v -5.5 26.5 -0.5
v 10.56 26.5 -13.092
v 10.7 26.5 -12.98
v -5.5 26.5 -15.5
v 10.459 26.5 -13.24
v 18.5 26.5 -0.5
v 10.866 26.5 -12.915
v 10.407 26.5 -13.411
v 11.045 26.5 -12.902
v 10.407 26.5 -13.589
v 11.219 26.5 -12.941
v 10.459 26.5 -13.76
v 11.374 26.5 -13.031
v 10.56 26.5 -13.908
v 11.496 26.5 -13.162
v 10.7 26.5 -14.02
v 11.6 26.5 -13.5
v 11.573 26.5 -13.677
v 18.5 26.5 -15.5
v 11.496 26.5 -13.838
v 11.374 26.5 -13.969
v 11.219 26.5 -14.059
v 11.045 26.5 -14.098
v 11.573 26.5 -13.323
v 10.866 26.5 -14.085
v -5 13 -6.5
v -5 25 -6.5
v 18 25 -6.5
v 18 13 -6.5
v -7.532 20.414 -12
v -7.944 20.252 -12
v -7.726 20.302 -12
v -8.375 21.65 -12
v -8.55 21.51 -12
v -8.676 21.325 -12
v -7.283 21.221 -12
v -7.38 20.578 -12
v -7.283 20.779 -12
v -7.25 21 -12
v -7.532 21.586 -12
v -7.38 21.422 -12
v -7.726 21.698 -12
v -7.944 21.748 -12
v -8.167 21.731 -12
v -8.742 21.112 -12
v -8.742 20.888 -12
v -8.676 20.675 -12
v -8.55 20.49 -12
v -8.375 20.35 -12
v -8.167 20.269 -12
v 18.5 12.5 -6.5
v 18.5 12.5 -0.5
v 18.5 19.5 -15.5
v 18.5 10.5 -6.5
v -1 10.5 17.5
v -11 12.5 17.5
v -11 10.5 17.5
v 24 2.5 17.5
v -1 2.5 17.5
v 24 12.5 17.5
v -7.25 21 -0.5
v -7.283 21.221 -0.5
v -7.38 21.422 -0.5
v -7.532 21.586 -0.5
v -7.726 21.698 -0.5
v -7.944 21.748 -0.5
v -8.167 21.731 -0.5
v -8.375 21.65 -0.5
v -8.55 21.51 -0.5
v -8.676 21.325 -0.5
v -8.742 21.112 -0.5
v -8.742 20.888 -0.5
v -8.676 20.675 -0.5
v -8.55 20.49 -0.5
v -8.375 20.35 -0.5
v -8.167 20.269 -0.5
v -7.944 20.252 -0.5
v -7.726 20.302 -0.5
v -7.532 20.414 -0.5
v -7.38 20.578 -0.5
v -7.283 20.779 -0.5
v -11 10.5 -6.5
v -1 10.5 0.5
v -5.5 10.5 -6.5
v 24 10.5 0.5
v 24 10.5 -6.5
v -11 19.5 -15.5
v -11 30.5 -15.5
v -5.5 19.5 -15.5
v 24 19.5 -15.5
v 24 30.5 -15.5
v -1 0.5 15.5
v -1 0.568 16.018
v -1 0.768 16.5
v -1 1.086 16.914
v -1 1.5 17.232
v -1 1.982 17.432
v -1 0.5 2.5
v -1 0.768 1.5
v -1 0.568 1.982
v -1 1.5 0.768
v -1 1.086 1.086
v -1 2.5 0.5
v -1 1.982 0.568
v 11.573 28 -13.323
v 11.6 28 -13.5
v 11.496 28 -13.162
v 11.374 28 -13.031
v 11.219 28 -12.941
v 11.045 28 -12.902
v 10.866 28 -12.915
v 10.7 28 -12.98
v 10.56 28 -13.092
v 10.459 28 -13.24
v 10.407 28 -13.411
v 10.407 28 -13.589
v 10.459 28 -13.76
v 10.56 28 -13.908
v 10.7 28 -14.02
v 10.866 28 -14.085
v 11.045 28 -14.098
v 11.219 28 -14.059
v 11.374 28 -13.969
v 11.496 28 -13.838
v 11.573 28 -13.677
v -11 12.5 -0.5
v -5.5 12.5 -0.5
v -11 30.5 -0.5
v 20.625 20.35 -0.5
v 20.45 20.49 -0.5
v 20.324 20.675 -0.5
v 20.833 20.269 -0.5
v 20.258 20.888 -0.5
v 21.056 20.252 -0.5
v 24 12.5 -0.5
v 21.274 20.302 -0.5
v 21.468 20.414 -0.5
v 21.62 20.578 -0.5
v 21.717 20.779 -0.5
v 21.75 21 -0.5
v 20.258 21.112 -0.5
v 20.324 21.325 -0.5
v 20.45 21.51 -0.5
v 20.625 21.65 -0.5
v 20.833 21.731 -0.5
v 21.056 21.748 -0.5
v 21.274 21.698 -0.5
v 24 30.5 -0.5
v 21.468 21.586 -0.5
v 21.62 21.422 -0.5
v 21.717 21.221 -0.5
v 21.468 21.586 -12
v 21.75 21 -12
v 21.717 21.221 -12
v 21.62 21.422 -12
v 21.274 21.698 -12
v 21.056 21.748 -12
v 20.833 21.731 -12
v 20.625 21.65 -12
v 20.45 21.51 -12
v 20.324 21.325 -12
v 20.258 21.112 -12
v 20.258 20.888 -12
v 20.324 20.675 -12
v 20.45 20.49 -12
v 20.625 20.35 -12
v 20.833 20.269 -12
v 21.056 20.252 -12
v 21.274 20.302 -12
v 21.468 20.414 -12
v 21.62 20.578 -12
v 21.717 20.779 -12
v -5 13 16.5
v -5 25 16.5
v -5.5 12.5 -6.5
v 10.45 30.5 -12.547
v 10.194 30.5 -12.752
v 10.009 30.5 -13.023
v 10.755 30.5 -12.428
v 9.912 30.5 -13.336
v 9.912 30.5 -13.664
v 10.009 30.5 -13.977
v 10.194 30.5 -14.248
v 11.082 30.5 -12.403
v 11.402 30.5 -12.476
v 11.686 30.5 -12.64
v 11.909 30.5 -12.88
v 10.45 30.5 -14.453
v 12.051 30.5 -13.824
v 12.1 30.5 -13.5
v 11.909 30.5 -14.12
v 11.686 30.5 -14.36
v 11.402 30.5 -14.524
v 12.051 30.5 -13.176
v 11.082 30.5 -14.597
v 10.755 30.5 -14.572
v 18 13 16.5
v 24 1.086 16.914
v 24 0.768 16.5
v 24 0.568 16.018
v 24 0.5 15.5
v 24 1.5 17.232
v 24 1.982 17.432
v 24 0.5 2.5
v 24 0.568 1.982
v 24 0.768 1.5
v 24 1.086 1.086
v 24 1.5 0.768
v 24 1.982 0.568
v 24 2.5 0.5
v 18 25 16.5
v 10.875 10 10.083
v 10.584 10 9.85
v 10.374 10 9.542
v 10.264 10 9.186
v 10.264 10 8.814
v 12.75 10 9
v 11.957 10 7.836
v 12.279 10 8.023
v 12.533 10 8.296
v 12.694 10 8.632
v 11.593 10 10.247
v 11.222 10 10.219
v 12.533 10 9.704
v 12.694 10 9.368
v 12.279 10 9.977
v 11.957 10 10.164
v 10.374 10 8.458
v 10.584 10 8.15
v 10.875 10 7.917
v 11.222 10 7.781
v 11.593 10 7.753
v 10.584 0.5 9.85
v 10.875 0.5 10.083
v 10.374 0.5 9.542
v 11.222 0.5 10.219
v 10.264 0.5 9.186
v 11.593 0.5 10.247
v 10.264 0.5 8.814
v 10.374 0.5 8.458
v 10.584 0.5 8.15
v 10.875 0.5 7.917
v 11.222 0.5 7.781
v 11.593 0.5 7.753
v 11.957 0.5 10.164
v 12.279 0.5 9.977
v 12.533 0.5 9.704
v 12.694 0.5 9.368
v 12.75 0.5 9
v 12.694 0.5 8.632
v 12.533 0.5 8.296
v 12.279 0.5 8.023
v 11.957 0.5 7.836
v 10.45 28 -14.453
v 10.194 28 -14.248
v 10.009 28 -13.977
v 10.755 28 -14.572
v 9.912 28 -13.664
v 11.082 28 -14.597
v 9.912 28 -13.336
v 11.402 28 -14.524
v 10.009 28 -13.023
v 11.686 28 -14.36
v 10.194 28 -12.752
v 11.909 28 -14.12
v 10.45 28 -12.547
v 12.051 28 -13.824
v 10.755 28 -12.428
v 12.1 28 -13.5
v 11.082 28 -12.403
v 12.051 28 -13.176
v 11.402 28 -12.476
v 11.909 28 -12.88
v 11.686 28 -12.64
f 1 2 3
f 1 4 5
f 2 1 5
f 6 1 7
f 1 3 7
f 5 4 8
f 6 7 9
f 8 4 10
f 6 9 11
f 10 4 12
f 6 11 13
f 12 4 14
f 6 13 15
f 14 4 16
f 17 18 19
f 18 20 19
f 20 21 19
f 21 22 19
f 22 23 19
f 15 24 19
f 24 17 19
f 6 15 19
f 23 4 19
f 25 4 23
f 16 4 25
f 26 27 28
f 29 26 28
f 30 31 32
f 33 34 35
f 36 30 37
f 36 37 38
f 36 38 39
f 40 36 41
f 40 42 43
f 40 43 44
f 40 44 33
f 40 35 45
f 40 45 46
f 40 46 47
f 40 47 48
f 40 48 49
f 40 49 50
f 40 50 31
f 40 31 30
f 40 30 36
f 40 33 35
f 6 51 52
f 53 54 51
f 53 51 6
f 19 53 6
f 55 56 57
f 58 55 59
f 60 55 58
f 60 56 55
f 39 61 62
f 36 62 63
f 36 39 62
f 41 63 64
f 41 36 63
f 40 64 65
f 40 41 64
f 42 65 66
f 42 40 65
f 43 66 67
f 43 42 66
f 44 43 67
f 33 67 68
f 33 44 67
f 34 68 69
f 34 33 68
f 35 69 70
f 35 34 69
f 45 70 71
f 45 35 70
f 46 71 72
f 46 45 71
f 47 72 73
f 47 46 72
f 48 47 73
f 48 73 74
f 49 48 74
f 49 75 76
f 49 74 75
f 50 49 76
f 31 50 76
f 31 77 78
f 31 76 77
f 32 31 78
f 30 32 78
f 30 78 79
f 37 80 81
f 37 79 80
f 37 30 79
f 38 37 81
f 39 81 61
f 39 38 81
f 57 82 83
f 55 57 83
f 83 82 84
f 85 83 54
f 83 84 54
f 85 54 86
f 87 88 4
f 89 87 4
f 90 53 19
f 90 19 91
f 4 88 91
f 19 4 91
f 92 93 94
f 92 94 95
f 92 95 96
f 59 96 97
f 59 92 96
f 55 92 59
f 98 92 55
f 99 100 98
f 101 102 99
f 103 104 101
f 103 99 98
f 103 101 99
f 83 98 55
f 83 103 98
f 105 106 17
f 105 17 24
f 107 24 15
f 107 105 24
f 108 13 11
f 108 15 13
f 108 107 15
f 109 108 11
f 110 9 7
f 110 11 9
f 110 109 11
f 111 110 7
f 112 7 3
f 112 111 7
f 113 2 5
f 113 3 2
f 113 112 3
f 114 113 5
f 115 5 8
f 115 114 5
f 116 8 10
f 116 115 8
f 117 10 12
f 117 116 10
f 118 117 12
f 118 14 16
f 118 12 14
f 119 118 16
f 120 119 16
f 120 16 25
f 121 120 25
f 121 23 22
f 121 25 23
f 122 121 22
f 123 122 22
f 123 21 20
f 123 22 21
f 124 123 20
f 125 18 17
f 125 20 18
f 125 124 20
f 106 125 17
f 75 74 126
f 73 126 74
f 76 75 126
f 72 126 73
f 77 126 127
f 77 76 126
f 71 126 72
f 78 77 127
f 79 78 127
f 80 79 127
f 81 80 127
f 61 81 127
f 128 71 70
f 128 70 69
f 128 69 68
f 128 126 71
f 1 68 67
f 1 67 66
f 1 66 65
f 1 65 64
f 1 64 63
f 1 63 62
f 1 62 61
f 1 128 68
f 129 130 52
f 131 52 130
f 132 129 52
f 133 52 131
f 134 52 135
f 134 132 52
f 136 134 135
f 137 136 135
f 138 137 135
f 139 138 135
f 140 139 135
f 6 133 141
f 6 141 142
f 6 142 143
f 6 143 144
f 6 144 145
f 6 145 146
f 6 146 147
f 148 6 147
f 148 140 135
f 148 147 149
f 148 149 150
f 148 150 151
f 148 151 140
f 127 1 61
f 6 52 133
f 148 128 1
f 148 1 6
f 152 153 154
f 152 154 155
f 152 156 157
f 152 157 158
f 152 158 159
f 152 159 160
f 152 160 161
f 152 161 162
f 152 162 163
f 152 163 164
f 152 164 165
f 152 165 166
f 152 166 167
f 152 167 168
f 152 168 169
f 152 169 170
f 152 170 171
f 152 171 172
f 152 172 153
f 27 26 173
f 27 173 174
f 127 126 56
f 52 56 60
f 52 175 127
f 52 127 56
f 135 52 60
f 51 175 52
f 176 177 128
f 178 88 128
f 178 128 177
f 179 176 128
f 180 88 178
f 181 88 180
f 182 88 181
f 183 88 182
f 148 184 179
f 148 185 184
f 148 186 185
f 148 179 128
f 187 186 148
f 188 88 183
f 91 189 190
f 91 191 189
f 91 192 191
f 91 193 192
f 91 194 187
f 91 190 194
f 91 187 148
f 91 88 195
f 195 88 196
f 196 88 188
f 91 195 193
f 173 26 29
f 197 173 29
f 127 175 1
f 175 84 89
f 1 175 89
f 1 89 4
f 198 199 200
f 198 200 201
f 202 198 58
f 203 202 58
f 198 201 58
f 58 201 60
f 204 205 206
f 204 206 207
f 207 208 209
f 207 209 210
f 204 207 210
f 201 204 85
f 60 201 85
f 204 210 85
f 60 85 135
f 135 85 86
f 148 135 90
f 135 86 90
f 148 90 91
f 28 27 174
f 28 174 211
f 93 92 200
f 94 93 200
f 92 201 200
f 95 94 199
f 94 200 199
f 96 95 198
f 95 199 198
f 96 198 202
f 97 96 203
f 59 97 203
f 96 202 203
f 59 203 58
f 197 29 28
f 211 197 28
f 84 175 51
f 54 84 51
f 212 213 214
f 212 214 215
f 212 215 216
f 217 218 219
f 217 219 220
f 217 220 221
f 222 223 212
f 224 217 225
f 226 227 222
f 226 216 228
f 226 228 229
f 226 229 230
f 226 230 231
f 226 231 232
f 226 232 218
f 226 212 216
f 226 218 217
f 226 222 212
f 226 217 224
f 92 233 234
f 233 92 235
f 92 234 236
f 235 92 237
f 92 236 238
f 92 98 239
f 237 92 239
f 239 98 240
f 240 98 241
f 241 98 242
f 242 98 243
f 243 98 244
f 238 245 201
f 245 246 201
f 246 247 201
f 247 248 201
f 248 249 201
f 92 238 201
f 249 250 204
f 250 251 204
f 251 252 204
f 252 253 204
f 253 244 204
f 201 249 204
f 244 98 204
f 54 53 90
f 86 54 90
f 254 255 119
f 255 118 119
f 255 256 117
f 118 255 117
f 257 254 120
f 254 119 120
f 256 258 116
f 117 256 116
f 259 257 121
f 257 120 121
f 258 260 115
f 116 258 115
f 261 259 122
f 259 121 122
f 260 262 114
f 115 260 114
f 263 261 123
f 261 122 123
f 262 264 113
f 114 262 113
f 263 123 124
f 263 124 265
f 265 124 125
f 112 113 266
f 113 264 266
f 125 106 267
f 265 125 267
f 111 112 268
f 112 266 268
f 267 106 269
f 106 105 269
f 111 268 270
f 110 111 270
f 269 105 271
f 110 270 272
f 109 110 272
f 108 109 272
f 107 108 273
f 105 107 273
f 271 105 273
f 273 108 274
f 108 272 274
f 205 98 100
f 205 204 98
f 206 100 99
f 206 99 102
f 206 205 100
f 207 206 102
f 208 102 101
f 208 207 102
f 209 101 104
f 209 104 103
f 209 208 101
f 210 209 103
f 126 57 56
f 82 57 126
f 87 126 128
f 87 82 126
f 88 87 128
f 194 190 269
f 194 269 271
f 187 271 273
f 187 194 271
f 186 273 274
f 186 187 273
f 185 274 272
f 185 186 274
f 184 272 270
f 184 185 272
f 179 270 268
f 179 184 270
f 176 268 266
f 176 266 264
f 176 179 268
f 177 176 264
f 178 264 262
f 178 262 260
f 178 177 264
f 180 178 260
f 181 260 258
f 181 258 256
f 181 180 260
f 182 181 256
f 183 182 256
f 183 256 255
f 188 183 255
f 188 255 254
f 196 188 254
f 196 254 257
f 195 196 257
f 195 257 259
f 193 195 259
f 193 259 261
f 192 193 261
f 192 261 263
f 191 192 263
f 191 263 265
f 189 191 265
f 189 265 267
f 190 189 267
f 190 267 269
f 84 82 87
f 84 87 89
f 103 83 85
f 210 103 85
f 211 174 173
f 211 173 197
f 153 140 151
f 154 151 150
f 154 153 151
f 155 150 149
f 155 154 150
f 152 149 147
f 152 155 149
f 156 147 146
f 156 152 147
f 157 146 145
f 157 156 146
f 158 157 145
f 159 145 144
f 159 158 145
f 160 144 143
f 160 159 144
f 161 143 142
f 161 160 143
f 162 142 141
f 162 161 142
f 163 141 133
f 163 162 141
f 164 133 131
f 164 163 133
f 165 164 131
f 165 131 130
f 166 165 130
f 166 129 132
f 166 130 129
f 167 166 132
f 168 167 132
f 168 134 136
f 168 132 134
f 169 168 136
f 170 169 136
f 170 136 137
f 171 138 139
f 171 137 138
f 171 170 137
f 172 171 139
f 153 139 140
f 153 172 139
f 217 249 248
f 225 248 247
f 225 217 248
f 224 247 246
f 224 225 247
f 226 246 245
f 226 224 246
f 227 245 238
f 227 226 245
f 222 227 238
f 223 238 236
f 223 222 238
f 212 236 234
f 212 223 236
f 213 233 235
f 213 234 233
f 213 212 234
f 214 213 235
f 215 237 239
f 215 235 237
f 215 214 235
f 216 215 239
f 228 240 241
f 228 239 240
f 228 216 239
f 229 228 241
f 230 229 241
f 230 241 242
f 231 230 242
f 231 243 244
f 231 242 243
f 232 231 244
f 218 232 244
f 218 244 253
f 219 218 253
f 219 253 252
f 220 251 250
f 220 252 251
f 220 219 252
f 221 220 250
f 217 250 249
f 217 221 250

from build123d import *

# Parameters (mm, degrees)
BOX003_W               = 23
BOX003_H               = 12
BOX003_DEPTH           = 23
CYLINDER004_R          = 1.25
CYLINDER004_DEPTH      = 10
CYLINDER004_ROLL_ANGLE = 90
CYLINDER003_R          = 0.75
CYLINDER003_DEPTH      = 12
CYLINDER002_R          = 0.75
CYLINDER002_DEPTH      = 12
CYLINDER001_R          = 0.6
CYLINDER001_DEPTH      = 7
CYLINDER001_ROLL_ANGLE = 90
CYLINDER_R             = 1.1
CYLINDER_DEPTH         = 4
CYLINDER_ROLL_ANGLE    = 90
BOX_W                  = 5.5
BOX_H                  = 20
BOX_DEPTH              = 15
BOX006_W               = 35
BOX006_H               = 4
BOX006_DEPTH           = 15
BOX005_W               = 35
BOX005_H               = 2
BOX005_DEPTH           = 24
BOX004_W               = 5.5
BOX004_H               = 20
BOX004_DEPTH           = 15
CHAMFER_SIZE           = 9
BOX001_W               = 25
BOX001_H               = 10
BOX001_DEPTH           = 17
FILLET001_R            = 2


with BuildPart() as servo:
    # Box003 → Box003 (new body)
    with BuildSketch(Plane(origin=(-5, 13, -6.5), x_dir=(1, 0, 0), z_dir=(0, 0, 1))):
        with Locations((11.5, 6)):
            Rectangle(BOX003_W, BOX003_H)
    extrude(amount=BOX003_DEPTH)


with BuildPart() as cylinder004:
    # Cylinder004 → Cylinder004 (new body)
    with BuildSketch(Plane.XY):
        Circle(CYLINDER004_R)
    extrude(amount=CYLINDER004_DEPTH)


with BuildPart() as cylinder004_1:
    # Cylinder004 roll: moved
    add(cylinder004.part.rotate(Axis((0, 0, 0), (1, 0, 0)), CYLINDER004_ROLL_ANGLE))


with BuildPart() as cylinder004_2:
    # Cylinder004 placement: moved
    add(cylinder004_1.part.moved(Location((11.5, 10, 9))))


with BuildPart() as cylinder003:
    # Cylinder003 → Cylinder003 (new body)
    with BuildSketch(Plane(origin=(29, 0, 0), x_dir=(1, 0, 0), z_dir=(0, 0, 1))):
        Circle(CYLINDER003_R)
    extrude(amount=CYLINDER003_DEPTH)


with BuildPart() as fusion003:
    # Cylinder002 → Cylinder002 (new body)
    with BuildSketch(Plane.XY):
        Circle(CYLINDER002_R)
    extrude(amount=CYLINDER002_DEPTH)

    # Fusion003: union Cylinder003
    add(cylinder003.part)


with BuildPart() as fusion003_1:
    # Fusion003 placement: moved
    add(fusion003.part.moved(Location((-8, 21, -12))))


with BuildPart() as cylinder001:
    # Cylinder001 → Cylinder001 (new body)
    with BuildSketch(Plane.XY):
        Circle(CYLINDER001_R)
    extrude(amount=CYLINDER001_DEPTH)


with BuildPart() as cylinder001_1:
    # Cylinder001 roll: moved
    add(cylinder001.part.rotate(Axis((0, 0, 0), (1, 0, 0)), CYLINDER001_ROLL_ANGLE))


with BuildPart() as cylinder001_2:
    # Cylinder001 placement: moved
    add(cylinder001_1.part.moved(Location((0, 30.5, 0))))


with BuildPart() as fusion001:
    # Cylinder → Cylinder (new body)
    with BuildSketch(Plane.XY):
        Circle(CYLINDER_R)
    extrude(amount=CYLINDER_DEPTH)


with BuildPart() as fusion001_1:
    # Cylinder roll: moved
    add(fusion001.part.rotate(Axis((0, 0, 0), (1, 0, 0)), CYLINDER_ROLL_ANGLE))


with BuildPart() as fusion001_2:
    # Cylinder placement: moved
    add(fusion001_1.part.moved(Location((0, 30.5, 0))))

    # Fusion001: union Cylinder001
    add(cylinder001_2.part)


with BuildPart() as fusion001_3:
    # Fusion001 placement: moved
    add(fusion001_2.part.moved(Location((11, 1.5, -13.5))))


with BuildPart() as box:
    # Box → Box (new body)
    with BuildSketch(Plane(origin=(18.5, 10.5, -15.5), x_dir=(1, 0, 0), z_dir=(0, 0, 1))):
        with Locations((2.75, 10)):
            Rectangle(BOX_W, BOX_H)
    extrude(amount=BOX_DEPTH)


with BuildPart() as box006:
    # Box006 → Box006 (new body)
    with BuildSketch(Plane(origin=(-11, 26.5, -15.5), x_dir=(1, 0, 0), z_dir=(0, 0, 1))):
        with Locations((17.5, 2)):
            Rectangle(BOX006_W, BOX006_H)
    extrude(amount=BOX006_DEPTH)


with BuildPart() as box005:
    # Box005 → Box005 (new body)
    with BuildSketch(Plane(origin=(-11, 10.5, -6.5), x_dir=(1, 0, 0), z_dir=(0, 0, 1))):
        with Locations((17.5, 1)):
            Rectangle(BOX005_W, BOX005_H)
    extrude(amount=BOX005_DEPTH)


with BuildPart() as chamfer_body:
    # Box004 → Box004 (new body)
    with BuildSketch(Plane(origin=(-11, 10.5, -15.5), x_dir=(1, 0, 0), z_dir=(0, 0, 1))):
        with Locations((2.75, 10)):
            Rectangle(BOX004_W, BOX004_H)
    extrude(amount=BOX004_DEPTH)

    # Fusion: union Box, Box006, Box005
    add(box.part)
    add(box006.part)
    add(box005.part)

    # Cut: cut Fusion001
    add(fusion001_3.part, mode=Mode.SUBTRACT)

    # Chamfer
    chamfer_edges = [chamfer_body.edges().sort_by_distance(p)[0] for p in [
        (21.25, 10.5, -15.5),
        (-8.25, 10.5, -15.5),
    ]]
    chamfer(chamfer_edges, length=CHAMFER_SIZE)


with BuildPart() as cut002:
    # Box001 → Box001 (new body)
    with BuildSketch(Plane.XY.offset(1.5)):
        with Locations((12.5, 5)):
            Rectangle(BOX001_W, BOX001_H)
    extrude(amount=BOX001_DEPTH)

    # Fillet001
    fillet001_edges = [cut002.edges().sort_by_distance(p)[0] for p in [
        (12.5, 0, 1.5),
        (12.5, 0, 18.5),
    ]]
    fillet(fillet001_edges, radius=FILLET001_R)


with BuildPart() as cut002_1:
    # Fillet001 placement: moved
    add(cut002.part.moved(Location((-1, 0.5, -1))))

    # Fusion002: union Chamfer body
    add(chamfer_body.part)

    # Cut001: cut Fusion003
    add(fusion003_1.part, mode=Mode.SUBTRACT)

    # Cut002: cut Cylinder004
    add(cylinder004_2.part, mode=Mode.SUBTRACT)


solid = Compound([servo.part, cut002_1.part])
